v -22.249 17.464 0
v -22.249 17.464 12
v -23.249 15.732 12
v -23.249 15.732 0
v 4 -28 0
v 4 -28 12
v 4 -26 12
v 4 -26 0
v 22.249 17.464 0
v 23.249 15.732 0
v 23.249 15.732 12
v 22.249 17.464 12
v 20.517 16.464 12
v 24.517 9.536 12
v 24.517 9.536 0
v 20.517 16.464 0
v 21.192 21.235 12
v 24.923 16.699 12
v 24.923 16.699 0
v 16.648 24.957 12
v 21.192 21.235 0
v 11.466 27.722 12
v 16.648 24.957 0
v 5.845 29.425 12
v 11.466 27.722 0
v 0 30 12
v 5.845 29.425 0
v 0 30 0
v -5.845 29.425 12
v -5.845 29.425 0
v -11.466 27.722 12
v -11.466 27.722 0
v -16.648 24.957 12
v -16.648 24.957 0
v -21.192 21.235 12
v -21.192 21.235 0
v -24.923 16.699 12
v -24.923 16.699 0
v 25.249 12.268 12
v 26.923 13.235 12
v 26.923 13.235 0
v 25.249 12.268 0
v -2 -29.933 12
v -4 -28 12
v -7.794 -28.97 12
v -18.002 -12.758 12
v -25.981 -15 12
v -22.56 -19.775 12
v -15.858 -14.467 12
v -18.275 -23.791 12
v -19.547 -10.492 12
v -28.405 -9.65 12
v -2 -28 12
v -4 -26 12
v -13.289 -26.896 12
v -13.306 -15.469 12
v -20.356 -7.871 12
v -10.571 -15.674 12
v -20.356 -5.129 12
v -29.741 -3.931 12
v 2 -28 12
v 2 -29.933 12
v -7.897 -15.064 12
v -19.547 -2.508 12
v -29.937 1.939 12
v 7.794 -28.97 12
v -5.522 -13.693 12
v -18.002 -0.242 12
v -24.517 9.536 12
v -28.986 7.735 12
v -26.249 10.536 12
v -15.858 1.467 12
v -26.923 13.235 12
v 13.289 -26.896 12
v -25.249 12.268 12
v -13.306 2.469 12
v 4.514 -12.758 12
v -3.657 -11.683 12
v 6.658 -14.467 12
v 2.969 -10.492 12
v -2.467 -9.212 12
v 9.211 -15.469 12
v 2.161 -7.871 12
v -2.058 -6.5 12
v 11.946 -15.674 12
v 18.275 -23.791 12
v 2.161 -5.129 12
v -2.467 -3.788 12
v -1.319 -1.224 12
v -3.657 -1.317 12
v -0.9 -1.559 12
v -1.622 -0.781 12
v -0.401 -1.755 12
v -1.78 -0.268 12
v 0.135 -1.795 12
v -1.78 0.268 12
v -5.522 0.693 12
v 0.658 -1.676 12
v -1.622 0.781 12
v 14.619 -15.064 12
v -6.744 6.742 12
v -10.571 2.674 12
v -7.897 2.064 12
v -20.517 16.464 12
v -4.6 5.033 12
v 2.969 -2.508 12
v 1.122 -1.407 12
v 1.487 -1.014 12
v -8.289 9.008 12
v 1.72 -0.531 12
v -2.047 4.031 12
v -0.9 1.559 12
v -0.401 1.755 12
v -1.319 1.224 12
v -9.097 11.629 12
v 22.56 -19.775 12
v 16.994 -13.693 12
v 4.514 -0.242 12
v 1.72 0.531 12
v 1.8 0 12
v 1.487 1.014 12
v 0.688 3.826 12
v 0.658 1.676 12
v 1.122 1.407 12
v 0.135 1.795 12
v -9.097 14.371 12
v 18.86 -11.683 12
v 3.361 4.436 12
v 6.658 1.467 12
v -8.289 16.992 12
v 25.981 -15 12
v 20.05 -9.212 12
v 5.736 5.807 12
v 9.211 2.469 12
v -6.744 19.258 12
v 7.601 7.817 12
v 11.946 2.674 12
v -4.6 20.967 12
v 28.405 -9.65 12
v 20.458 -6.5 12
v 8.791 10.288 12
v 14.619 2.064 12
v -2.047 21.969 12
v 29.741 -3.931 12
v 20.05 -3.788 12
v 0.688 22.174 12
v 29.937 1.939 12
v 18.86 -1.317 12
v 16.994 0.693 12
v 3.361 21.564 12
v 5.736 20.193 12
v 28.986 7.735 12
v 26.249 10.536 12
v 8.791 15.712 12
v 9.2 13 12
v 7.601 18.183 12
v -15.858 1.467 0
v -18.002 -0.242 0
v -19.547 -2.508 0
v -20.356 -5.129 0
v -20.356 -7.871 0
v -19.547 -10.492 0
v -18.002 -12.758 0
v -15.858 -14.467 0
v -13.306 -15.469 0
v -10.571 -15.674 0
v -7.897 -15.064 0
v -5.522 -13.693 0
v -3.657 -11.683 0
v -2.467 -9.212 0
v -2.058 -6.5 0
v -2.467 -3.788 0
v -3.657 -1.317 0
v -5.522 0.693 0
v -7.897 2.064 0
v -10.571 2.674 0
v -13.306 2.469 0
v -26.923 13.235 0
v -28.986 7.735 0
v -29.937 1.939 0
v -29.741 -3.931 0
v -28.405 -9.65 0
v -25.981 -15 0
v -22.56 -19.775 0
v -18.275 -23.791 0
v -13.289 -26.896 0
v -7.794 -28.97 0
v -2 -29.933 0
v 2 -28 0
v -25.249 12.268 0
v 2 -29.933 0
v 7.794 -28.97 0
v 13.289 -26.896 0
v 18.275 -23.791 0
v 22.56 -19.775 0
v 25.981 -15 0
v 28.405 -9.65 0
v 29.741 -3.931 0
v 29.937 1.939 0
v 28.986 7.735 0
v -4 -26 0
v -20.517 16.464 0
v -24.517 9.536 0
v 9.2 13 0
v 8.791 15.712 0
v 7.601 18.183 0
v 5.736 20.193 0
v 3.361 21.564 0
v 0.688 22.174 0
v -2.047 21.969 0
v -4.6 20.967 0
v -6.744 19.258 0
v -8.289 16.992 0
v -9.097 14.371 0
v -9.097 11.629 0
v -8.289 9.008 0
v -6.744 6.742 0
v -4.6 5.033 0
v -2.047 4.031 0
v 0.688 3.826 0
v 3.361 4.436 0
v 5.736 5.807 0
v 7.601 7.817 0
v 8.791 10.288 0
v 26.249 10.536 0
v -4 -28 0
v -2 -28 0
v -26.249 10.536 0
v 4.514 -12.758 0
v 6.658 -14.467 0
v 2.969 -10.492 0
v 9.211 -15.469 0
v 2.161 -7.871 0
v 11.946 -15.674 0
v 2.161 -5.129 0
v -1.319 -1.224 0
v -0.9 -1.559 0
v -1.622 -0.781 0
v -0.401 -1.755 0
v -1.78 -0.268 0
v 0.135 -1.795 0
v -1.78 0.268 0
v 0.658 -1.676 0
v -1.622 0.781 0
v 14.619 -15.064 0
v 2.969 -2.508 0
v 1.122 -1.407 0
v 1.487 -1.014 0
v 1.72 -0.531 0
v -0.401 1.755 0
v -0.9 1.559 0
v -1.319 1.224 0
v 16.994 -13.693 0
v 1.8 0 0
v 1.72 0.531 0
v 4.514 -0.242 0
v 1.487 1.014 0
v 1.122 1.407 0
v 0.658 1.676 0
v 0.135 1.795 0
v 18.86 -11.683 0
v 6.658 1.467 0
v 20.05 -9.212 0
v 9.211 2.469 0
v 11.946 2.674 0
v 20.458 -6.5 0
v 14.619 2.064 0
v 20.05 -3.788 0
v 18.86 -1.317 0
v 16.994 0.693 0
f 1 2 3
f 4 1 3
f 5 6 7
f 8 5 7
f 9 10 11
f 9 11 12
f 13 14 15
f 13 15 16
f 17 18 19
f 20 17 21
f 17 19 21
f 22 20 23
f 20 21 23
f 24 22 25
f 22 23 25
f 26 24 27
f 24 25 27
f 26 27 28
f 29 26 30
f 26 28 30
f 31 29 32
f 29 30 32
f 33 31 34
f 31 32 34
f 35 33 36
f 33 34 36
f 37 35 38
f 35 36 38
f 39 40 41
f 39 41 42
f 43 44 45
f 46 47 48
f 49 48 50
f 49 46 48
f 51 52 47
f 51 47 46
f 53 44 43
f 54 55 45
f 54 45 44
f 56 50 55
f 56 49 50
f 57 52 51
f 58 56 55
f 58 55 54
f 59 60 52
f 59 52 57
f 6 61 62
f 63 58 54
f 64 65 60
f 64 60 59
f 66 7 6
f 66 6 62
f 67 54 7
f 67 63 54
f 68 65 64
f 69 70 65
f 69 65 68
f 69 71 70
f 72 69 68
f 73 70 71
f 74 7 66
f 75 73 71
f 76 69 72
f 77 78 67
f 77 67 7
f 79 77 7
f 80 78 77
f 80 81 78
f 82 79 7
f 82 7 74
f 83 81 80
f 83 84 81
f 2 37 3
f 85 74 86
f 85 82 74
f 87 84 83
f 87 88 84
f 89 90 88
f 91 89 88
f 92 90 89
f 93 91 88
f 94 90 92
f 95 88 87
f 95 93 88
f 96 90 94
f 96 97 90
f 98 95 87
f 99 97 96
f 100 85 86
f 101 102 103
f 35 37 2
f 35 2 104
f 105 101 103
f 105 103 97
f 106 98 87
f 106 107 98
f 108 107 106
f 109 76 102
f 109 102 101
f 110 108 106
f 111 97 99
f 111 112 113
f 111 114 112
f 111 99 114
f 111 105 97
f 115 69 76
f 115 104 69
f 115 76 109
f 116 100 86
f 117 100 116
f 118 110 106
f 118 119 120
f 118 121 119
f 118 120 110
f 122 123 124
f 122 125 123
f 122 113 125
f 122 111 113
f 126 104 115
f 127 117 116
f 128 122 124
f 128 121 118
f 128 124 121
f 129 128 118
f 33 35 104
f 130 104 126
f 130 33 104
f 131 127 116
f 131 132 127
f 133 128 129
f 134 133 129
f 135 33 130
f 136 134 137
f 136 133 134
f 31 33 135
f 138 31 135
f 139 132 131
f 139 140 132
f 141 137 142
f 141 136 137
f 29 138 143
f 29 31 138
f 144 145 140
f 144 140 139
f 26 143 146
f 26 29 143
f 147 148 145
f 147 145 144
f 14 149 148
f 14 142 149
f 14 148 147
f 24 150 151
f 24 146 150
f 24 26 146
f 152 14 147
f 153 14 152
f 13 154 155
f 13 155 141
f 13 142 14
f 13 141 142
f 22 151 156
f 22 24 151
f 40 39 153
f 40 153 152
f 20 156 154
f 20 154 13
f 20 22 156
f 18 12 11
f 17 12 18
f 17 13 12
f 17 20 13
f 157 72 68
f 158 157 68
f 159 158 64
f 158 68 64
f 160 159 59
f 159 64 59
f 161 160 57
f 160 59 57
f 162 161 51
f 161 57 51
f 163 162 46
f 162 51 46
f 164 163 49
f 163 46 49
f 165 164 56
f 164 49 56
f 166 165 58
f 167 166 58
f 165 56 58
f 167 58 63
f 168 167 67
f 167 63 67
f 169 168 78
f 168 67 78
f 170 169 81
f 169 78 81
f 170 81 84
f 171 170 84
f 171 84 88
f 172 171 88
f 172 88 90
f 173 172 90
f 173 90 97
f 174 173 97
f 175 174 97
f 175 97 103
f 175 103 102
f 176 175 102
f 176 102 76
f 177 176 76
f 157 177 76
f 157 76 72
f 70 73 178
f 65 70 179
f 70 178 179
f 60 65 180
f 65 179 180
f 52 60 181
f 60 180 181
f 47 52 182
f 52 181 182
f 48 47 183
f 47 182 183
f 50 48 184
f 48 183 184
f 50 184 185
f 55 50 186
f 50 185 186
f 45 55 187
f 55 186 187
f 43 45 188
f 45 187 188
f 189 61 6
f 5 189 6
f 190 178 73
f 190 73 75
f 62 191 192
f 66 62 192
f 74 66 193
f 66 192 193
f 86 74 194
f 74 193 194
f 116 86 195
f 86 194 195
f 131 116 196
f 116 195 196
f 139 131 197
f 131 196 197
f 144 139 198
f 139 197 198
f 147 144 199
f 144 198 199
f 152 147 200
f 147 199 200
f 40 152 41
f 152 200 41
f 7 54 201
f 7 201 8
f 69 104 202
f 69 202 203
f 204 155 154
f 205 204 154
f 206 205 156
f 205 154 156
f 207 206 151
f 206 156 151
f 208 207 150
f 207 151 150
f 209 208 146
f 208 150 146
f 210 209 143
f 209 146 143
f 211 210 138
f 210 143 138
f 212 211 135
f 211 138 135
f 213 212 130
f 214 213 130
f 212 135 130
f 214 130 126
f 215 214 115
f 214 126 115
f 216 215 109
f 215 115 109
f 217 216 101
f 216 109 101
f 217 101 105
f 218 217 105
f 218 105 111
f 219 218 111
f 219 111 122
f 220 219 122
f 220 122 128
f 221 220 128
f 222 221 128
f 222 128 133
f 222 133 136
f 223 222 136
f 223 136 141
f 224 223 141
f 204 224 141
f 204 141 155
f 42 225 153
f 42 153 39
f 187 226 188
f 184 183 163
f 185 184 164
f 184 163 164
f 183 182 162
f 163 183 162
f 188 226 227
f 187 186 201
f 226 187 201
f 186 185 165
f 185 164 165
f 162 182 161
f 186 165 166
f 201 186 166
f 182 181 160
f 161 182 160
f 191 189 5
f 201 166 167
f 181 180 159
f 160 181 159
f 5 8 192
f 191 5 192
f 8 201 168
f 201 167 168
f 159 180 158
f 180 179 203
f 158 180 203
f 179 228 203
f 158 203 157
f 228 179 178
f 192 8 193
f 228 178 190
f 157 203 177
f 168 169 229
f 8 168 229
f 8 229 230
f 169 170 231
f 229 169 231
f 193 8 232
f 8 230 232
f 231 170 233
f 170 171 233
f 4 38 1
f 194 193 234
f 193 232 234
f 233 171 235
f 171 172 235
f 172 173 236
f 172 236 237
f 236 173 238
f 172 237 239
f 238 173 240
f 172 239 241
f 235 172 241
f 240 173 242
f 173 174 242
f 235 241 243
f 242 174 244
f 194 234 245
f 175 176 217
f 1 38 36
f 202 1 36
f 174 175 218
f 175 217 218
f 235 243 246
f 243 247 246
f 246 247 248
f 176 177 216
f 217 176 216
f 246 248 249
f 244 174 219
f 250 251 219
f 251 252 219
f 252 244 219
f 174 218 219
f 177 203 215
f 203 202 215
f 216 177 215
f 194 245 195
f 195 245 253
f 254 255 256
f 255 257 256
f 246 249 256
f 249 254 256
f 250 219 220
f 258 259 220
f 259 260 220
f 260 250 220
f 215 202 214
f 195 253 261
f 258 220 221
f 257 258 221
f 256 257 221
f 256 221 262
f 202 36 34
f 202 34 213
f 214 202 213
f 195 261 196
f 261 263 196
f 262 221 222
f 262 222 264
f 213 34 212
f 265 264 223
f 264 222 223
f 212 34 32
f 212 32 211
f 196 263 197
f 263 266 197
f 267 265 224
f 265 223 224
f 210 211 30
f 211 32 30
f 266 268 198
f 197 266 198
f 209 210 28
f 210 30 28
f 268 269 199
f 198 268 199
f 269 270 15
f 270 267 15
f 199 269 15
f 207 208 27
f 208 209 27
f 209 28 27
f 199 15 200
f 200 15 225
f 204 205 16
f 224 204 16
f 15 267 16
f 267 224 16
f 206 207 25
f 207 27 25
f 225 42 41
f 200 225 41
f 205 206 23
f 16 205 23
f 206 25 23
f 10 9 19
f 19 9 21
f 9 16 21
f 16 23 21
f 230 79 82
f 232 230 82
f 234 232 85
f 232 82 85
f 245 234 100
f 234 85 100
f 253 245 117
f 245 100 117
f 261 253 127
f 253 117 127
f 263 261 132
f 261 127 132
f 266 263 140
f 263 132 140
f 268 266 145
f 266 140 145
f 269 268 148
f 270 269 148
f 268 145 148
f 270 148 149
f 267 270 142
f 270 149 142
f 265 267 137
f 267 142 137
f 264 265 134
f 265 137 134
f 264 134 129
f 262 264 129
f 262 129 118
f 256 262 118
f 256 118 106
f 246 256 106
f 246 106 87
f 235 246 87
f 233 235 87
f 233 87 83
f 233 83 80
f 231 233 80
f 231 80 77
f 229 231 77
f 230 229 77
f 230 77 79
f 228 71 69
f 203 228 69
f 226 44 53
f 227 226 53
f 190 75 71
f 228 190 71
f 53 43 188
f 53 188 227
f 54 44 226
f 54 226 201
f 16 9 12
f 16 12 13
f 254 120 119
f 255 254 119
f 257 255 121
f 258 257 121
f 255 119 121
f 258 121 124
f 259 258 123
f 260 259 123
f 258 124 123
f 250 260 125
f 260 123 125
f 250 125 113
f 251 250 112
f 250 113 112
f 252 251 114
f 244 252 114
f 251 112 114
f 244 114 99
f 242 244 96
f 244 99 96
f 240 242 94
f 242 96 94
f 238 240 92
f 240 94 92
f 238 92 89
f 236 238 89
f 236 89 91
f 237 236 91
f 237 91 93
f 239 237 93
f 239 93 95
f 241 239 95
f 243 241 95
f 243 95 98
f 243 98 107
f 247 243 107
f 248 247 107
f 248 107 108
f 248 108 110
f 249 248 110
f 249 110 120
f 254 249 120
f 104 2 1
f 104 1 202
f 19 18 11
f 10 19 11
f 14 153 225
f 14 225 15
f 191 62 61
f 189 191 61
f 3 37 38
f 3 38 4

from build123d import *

# Parameters (mm, degrees)
SKETCH_R              = 30
PAD_DEPTH             = 12
SKETCH001_R           = 9.2
POCKET_DEPTH          = 183.395282
POLARPATTERN_COUNT    = 3
SKETCH002_R           = 1.8
POCKET001_DEPTH       = 12.001
SKETCH003_W           = 4
SKETCH003_H           = 4
SKETCH003_W_2         = 8
SKETCH003_H_2         = 2
POCKET002_DEPTH       = 183.395282
POLARPATTERN001_COUNT = 3


with BuildPart() as part:
    # Sketch → Pad (new body)
    with BuildSketch(Plane.XY):
        Circle(SKETCH_R)
    extrude(amount=PAD_DEPTH)

    # Sketch001 (on Face3 of Pad) → Pocket (cut, through all)
    with BuildSketch(Plane.XY.offset(12)):
        with Locations((0, 13)):
            Circle(SKETCH001_R)
    pocket = extrude(amount=-POCKET_DEPTH, mode=Mode.SUBTRACT)

    # PolarPattern: Pocket ×3 about axis
    polarpattern_axis = Axis((0, 0, 12), (0, 0, 1))
    for i in range(1, POLARPATTERN_COUNT):
        add(pocket.rotate(polarpattern_axis, i * 360 / POLARPATTERN_COUNT), mode=Mode.SUBTRACT)

    # Sketch002 (on Face3 of PolarPattern) → Pocket001 (cut, through all)
    with BuildSketch(Plane.XY.offset(12)):
        Circle(SKETCH002_R)
    extrude(amount=-POCKET001_DEPTH, mode=Mode.SUBTRACT)

    # Sketch003 (on Face3 of Pocket001) → Pocket002 (cut, through all)
    with BuildSketch(Plane.XY.offset(12)):
        with Locations((0, -30)):
            Rectangle(SKETCH003_W, SKETCH003_H)
        with Locations((0, -27)):
            Rectangle(SKETCH003_W_2, SKETCH003_H_2)
    pocket002 = extrude(amount=-POCKET002_DEPTH, mode=Mode.SUBTRACT)

    # PolarPattern001: Pocket002 ×3 about axis
    polarpattern001_axis = Axis((0, 0, 12), (0, 0, 1))
    for i in range(1, POLARPATTERN001_COUNT):
        add(pocket002.rotate(polarpattern001_axis, i * 360 / POLARPATTERN001_COUNT), mode=Mode.SUBTRACT)


solid = part.part
